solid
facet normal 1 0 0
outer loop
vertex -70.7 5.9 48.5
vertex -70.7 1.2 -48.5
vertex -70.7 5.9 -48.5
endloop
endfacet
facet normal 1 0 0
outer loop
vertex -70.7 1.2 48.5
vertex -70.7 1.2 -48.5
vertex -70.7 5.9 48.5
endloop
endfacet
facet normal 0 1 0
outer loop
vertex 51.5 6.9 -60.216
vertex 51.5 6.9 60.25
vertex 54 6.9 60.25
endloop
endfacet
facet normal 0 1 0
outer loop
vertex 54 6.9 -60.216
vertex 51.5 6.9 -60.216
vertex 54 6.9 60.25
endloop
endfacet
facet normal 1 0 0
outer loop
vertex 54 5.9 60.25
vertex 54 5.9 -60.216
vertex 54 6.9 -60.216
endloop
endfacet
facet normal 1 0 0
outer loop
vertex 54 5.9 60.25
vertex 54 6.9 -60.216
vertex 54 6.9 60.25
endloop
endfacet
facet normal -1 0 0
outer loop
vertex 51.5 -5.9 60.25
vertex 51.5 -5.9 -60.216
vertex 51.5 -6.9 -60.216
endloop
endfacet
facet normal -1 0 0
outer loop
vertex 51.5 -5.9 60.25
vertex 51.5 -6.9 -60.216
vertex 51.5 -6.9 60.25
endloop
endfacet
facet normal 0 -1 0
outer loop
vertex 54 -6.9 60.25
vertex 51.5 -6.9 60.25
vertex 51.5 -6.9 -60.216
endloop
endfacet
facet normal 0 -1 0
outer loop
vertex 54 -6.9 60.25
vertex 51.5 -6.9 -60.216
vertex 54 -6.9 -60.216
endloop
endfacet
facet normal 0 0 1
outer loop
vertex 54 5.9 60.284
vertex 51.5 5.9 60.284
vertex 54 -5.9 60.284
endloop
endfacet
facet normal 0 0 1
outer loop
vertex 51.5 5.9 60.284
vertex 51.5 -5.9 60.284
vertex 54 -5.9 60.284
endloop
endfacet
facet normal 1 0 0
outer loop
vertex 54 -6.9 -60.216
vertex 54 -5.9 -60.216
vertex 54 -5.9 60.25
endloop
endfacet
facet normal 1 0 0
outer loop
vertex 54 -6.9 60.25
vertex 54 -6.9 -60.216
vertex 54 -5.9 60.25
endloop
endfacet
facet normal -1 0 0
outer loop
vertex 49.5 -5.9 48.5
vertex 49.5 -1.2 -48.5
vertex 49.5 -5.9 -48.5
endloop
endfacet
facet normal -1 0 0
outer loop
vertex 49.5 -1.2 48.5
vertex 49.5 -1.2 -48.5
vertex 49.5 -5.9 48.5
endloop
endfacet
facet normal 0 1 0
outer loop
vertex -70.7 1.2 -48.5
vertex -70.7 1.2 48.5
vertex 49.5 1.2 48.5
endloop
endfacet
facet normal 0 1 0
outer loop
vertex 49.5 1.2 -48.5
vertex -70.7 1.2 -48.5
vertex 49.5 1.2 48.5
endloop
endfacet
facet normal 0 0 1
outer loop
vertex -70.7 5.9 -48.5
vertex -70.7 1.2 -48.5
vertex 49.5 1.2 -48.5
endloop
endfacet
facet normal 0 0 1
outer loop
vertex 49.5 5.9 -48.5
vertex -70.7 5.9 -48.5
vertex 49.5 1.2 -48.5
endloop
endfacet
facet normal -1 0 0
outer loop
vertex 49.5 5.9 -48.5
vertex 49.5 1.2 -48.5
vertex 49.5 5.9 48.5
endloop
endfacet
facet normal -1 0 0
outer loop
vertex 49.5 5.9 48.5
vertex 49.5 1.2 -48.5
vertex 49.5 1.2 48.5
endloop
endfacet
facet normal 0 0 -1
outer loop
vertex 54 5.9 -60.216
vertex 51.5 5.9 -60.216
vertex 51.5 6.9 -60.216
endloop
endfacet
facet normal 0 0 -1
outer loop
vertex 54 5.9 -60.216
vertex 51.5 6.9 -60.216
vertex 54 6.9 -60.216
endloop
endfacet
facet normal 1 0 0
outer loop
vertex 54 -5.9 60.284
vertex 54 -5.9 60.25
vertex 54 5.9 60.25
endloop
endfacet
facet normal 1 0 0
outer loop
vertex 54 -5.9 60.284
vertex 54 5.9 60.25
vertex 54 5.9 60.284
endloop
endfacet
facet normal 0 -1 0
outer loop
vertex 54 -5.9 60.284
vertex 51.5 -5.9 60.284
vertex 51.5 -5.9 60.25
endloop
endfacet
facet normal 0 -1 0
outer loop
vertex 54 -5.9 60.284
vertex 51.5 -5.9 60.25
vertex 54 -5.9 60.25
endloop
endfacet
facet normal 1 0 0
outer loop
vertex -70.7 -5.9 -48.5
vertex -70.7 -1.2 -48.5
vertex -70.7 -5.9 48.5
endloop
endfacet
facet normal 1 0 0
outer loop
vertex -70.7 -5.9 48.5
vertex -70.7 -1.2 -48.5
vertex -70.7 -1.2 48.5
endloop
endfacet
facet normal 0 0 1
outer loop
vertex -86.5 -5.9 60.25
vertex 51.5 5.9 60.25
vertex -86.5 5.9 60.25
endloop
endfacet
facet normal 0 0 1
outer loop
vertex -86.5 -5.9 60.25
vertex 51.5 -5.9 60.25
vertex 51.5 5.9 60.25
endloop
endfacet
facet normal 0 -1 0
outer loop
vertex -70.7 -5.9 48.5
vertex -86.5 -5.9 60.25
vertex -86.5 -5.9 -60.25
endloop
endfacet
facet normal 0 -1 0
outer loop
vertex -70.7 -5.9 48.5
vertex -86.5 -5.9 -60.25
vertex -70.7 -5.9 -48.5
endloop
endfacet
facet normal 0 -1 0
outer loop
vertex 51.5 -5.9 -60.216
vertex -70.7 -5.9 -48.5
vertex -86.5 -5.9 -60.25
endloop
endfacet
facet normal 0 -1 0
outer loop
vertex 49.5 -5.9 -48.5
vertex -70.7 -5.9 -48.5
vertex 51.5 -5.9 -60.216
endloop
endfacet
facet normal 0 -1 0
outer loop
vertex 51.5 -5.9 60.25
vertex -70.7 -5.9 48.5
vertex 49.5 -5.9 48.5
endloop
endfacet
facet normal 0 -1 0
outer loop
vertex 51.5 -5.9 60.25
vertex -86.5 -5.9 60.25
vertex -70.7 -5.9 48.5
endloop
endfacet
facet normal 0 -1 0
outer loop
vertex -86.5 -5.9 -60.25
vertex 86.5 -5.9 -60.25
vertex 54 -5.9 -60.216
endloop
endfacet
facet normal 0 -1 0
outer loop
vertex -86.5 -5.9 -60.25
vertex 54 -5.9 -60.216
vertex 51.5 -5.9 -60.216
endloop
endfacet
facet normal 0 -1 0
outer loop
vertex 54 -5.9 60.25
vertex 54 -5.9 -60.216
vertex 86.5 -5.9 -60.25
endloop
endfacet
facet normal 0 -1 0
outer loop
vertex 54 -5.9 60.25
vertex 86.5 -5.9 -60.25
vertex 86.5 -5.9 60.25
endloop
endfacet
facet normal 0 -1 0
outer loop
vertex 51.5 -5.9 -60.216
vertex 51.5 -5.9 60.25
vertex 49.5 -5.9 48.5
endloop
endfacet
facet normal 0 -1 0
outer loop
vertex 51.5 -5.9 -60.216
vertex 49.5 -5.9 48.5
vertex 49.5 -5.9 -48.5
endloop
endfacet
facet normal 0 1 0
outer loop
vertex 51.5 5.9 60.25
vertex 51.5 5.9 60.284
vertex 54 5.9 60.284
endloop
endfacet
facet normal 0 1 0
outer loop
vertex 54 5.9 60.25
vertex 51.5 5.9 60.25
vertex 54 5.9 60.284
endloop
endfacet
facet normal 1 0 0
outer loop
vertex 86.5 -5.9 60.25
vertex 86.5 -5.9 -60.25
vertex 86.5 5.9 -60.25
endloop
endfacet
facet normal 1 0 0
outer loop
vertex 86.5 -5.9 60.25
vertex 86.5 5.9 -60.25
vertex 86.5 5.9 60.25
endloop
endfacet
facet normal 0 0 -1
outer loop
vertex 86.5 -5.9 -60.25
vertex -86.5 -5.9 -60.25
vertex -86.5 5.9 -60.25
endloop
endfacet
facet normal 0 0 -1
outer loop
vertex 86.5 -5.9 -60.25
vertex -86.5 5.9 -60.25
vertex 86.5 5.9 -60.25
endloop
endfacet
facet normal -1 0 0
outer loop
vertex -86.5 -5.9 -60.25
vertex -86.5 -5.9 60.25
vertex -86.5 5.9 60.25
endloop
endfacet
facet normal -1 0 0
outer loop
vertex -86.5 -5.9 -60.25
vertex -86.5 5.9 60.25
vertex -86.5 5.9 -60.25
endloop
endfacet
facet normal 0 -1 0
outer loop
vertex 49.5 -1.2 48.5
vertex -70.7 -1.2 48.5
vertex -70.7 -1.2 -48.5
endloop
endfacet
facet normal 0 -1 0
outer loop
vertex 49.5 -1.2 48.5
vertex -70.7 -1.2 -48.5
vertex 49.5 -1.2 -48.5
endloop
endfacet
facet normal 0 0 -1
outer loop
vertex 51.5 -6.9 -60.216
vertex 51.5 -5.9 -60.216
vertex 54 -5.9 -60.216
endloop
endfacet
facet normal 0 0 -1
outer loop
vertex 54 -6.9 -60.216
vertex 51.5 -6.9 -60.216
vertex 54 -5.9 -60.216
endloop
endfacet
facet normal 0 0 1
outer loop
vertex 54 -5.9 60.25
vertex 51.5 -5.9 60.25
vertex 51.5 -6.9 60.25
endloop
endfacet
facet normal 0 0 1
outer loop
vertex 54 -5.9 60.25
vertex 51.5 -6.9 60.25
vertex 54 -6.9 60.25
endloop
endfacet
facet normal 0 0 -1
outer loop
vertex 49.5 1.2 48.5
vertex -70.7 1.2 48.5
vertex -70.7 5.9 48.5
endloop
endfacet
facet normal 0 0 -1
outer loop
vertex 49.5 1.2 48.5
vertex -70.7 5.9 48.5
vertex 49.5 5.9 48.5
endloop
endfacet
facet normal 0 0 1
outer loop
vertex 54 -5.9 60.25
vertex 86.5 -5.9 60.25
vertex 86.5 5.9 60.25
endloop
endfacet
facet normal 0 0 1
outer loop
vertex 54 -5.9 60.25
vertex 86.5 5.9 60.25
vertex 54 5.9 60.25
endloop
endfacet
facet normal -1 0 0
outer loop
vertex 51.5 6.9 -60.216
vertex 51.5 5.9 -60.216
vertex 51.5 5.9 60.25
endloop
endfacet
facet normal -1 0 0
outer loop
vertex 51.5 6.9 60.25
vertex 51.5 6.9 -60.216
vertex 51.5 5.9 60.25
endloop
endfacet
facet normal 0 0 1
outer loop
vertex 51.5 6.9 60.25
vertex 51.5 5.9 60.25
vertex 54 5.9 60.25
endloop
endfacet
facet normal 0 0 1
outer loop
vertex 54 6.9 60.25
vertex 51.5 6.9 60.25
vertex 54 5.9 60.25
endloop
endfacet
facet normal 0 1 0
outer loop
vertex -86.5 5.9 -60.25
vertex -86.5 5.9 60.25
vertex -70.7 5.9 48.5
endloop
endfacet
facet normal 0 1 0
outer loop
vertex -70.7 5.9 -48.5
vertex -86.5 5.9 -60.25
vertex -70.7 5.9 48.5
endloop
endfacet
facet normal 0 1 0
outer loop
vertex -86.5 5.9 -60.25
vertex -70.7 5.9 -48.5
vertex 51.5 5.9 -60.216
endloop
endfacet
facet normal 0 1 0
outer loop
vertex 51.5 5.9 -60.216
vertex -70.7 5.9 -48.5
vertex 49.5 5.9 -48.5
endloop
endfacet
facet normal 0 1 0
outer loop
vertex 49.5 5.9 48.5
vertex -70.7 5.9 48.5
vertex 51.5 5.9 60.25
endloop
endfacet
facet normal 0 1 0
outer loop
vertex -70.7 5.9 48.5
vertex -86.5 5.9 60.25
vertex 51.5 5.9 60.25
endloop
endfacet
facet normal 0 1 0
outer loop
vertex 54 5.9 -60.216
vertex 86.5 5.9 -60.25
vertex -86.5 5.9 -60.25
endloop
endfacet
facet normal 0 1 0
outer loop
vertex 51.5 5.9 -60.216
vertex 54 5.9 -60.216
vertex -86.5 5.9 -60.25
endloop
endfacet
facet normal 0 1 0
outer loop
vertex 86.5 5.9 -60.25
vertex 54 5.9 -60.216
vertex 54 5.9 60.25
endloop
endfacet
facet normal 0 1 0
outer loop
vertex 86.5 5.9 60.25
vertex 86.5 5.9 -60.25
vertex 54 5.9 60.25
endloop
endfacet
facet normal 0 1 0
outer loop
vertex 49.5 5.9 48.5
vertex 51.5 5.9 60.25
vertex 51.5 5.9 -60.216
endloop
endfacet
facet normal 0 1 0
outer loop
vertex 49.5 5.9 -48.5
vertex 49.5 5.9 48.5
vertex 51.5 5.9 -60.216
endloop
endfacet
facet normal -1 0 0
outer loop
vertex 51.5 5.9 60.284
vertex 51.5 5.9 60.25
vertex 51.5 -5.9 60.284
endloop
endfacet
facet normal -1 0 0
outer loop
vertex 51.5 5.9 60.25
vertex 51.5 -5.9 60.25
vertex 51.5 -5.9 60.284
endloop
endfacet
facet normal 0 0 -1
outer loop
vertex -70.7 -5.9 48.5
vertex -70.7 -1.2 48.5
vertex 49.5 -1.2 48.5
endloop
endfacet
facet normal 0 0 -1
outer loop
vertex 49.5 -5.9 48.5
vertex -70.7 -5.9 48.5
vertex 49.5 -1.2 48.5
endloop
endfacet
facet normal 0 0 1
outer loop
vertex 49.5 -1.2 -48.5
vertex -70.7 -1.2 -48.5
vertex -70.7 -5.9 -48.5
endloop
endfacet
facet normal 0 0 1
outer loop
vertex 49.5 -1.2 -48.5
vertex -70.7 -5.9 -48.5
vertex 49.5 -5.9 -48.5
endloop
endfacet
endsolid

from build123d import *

# Parameters (mm, degrees)
F0_W     = 120.2
F0_H     = 97
F0_W_2   = 2.5
F0_H_2   = 0.03408
F1_DEPTH = 5.9
F0_H_3   = 120.46592
F2_DEPTH = 6.9
F3_DEPTH = 1.2


with BuildPart() as f1:
    # F0 (on Front) → F1 (new body)
    with BuildSketch(Plane.XZ):
        Polygon((51.5, 60.25), (-86.5, 60.25), (-86.5, -60.25), (86.5, -60.25), (86.5, 60.25), (54, 60.25), (54, -60.21592), (51.5, -60.21592), align=None)
        with Locations((-10.6, 0)):
            Rectangle(F0_W, F0_H, mode=Mode.SUBTRACT)
        with Locations((52.75, 60.26704)):
            Rectangle(F0_W_2, F0_H_2)
    extrude(amount=F1_DEPTH)

    # F0 (on Front) → F2 (join)
    with BuildSketch(Plane.XZ):
        with Locations((52.75, 0.01704)):
            Rectangle(F0_W_2, F0_H_3)
    extrude(amount=F2_DEPTH)

    # F0 (on Front) → F3 (join)
    with BuildSketch(Plane.XZ):
        with Locations((-10.6, 0)):
            Rectangle(F0_W, F0_H)
    extrude(amount=F3_DEPTH)

    # F4: F1 across face


with BuildPart() as f1_1:
    add(f1.part)
    add(f1.part.mirror(Plane(origin=(0.000216, 0, 0.000246), x_dir=(1, 0, 0), z_dir=(0, 1, 0))))


solid = f1_1.part
